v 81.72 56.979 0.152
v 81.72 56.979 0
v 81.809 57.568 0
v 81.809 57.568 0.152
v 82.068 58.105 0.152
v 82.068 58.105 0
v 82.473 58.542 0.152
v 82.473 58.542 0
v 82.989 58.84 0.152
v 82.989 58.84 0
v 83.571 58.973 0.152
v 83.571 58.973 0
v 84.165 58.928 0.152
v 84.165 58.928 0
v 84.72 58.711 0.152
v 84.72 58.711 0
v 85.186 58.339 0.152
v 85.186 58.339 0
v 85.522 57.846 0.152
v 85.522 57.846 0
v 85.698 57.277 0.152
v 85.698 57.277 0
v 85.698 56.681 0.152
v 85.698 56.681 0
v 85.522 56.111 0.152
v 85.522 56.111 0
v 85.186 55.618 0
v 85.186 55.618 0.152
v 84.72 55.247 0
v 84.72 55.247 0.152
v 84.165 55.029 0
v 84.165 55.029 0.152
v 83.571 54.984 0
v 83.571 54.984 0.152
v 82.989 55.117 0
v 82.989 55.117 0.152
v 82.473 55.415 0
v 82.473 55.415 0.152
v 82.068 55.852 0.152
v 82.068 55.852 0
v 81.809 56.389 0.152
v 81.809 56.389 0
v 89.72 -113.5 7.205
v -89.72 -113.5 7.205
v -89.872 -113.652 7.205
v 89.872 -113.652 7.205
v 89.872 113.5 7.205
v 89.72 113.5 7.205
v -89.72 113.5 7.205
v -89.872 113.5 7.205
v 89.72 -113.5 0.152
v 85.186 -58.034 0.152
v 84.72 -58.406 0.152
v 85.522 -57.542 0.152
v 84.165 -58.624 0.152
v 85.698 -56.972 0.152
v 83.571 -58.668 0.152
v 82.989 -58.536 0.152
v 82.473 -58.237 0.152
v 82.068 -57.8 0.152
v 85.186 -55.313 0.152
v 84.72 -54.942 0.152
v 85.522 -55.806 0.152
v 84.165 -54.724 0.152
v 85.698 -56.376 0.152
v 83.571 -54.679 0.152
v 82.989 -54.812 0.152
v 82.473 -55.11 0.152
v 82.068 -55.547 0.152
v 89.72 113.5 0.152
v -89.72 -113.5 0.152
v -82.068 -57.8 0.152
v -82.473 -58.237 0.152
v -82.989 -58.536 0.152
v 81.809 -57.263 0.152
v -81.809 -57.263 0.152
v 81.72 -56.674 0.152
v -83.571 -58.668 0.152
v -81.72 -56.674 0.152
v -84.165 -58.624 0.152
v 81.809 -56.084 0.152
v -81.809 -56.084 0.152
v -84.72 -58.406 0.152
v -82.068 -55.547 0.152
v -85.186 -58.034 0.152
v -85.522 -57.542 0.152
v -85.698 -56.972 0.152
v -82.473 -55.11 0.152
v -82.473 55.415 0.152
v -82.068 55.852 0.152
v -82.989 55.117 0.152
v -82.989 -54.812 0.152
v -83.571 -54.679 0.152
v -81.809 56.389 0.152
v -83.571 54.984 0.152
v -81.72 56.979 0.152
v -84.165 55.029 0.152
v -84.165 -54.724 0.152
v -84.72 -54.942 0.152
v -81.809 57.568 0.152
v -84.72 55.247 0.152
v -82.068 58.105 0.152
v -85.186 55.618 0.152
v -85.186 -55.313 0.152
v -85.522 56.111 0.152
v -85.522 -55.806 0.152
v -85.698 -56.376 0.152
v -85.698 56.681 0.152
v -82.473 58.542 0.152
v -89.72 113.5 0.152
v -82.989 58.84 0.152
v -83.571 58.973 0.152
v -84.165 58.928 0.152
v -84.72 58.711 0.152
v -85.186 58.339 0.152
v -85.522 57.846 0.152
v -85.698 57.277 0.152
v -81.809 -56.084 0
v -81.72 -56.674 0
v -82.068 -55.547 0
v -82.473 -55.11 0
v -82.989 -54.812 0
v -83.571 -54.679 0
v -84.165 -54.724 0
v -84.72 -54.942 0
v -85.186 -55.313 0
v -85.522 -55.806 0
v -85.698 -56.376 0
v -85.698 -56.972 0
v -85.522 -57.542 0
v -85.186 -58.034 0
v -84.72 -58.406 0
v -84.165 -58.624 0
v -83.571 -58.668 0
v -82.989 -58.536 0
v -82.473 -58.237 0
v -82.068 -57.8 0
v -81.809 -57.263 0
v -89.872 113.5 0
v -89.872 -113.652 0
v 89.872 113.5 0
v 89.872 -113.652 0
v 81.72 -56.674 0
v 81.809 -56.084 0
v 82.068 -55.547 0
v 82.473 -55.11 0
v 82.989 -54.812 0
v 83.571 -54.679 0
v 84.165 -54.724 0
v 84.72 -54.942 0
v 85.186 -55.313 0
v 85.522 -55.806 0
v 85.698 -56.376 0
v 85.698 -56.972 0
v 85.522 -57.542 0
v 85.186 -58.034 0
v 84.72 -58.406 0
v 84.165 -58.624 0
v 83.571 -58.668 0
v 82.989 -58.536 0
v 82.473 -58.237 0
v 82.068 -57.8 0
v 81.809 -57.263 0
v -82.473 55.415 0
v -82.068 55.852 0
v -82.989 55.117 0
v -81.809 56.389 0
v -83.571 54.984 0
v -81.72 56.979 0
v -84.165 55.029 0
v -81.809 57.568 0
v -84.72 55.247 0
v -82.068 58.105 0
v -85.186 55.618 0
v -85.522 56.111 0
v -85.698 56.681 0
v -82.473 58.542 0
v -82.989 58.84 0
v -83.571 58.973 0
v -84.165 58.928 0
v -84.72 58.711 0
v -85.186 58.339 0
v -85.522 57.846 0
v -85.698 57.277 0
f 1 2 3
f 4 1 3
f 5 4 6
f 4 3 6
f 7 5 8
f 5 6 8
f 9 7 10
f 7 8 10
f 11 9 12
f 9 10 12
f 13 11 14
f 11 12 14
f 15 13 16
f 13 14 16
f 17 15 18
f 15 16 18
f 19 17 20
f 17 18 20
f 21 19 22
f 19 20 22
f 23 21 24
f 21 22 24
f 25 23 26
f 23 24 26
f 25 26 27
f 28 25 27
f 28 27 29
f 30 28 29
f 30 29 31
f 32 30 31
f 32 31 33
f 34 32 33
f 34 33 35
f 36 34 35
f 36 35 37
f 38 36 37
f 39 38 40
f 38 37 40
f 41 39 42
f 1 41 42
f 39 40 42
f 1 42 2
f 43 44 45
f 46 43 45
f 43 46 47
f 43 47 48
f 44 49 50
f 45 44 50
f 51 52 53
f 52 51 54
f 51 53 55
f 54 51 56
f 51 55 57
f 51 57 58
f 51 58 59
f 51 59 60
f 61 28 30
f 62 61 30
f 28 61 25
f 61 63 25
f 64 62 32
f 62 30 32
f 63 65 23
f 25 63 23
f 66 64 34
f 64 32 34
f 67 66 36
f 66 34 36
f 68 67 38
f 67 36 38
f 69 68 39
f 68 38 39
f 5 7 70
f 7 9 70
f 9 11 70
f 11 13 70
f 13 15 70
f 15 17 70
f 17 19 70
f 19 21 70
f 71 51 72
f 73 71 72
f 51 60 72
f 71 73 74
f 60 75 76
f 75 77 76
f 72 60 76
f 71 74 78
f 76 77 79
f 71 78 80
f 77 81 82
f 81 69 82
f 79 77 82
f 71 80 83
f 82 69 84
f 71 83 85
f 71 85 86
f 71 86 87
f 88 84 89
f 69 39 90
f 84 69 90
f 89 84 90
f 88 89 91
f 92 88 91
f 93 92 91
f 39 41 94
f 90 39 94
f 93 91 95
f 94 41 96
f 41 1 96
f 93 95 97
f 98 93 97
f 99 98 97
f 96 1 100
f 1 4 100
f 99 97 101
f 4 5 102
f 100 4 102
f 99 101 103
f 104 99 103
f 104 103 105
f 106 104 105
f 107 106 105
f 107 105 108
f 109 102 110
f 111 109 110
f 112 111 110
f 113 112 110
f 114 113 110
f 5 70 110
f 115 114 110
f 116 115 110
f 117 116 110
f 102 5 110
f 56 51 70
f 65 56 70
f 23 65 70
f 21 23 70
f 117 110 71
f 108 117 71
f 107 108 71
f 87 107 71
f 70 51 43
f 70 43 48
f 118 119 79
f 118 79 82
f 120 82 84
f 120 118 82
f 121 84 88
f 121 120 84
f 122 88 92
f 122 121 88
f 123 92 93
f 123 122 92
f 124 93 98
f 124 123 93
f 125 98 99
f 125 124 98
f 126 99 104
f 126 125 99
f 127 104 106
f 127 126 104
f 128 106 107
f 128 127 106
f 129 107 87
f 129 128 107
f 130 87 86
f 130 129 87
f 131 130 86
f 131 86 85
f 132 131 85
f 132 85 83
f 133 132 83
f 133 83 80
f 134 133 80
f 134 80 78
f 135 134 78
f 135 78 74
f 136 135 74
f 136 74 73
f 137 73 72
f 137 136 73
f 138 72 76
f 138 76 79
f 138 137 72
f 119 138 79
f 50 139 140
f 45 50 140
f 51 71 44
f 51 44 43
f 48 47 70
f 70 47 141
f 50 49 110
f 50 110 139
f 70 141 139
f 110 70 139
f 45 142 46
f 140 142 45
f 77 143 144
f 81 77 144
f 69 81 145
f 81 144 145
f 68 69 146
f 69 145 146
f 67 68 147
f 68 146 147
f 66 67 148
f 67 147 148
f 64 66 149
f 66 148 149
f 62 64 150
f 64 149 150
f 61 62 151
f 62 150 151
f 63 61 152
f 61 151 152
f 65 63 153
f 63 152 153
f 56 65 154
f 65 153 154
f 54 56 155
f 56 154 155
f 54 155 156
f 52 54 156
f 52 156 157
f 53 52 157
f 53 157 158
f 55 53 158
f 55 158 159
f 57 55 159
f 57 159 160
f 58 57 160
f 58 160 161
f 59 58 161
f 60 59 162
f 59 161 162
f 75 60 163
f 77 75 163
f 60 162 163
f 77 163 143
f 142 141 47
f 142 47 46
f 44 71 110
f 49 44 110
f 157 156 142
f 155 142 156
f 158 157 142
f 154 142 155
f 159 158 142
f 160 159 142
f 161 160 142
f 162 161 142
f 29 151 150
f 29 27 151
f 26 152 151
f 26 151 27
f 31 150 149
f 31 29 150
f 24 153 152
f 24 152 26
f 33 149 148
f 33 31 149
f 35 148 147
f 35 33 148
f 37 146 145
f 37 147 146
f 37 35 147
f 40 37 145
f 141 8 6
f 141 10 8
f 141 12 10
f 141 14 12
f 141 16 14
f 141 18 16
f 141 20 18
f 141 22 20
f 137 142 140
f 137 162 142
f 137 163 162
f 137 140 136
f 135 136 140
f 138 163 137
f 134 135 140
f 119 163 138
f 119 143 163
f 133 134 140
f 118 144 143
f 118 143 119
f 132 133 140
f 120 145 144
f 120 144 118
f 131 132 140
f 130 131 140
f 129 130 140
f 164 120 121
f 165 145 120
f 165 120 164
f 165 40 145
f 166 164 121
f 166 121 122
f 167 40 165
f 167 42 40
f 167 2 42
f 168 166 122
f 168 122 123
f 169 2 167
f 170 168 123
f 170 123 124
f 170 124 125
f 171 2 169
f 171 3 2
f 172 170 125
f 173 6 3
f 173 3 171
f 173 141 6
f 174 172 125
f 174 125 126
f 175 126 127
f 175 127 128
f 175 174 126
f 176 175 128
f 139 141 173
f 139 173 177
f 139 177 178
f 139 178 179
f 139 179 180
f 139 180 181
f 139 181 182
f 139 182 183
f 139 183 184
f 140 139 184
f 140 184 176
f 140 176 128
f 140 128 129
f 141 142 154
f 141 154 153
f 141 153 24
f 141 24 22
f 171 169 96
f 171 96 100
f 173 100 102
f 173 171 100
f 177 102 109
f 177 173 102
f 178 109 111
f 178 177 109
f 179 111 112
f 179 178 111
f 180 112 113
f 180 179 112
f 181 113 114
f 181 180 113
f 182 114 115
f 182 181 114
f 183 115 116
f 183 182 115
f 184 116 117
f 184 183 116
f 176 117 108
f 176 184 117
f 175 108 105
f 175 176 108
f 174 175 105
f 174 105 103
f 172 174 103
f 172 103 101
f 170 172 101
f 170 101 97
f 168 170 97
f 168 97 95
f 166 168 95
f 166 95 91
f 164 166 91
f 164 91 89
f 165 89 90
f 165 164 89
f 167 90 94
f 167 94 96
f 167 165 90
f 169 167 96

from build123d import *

# Parameters (mm, degrees)
SKETCH1_W            = 89.72
SKETCH1_H            = 227
SKETCH1_R            = 2
HEAT_EXCHANGER_DEPTH = 0.1524
CONVECTION_FIN_DEPTH = 7.2048


with BuildPart() as part:
    # Sketch1 → Heat Exchanger (new body)
    with BuildSketch(Plane.XY):
        with Locations((-44.86, 0)):
            Rectangle(SKETCH1_W, SKETCH1_H)
        with Locations((-83.72, -56.6738)):
            Circle(SKETCH1_R, mode=Mode.SUBTRACT)
        with Locations((-83.72, 56.9786)):
            Circle(SKETCH1_R, mode=Mode.SUBTRACT)
    heat_exchanger = extrude(amount=HEAT_EXCHANGER_DEPTH)

    # Sketch3 → Convection Fin (add)
    with BuildSketch(Plane.XY):
        Polygon((0, -113.6524), (0, -113.5), (-89.72, -113.5), (-89.72, 113.5), (-89.8724, 113.5), (-89.8724, -113.6524), align=None)
    convection_fin = extrude(amount=CONVECTION_FIN_DEPTH)

    # Mirror1: Heat Exchanger, Convection Fin across plane
    add(heat_exchanger.mirror(Plane(origin=(0, 0, 0), x_dir=(0, 0, 1), z_dir=(1, 0, 0))))
    add(convection_fin.mirror(Plane(origin=(0, 0, 0), x_dir=(0, 0, 1), z_dir=(1, 0, 0))))


solid = part.part
